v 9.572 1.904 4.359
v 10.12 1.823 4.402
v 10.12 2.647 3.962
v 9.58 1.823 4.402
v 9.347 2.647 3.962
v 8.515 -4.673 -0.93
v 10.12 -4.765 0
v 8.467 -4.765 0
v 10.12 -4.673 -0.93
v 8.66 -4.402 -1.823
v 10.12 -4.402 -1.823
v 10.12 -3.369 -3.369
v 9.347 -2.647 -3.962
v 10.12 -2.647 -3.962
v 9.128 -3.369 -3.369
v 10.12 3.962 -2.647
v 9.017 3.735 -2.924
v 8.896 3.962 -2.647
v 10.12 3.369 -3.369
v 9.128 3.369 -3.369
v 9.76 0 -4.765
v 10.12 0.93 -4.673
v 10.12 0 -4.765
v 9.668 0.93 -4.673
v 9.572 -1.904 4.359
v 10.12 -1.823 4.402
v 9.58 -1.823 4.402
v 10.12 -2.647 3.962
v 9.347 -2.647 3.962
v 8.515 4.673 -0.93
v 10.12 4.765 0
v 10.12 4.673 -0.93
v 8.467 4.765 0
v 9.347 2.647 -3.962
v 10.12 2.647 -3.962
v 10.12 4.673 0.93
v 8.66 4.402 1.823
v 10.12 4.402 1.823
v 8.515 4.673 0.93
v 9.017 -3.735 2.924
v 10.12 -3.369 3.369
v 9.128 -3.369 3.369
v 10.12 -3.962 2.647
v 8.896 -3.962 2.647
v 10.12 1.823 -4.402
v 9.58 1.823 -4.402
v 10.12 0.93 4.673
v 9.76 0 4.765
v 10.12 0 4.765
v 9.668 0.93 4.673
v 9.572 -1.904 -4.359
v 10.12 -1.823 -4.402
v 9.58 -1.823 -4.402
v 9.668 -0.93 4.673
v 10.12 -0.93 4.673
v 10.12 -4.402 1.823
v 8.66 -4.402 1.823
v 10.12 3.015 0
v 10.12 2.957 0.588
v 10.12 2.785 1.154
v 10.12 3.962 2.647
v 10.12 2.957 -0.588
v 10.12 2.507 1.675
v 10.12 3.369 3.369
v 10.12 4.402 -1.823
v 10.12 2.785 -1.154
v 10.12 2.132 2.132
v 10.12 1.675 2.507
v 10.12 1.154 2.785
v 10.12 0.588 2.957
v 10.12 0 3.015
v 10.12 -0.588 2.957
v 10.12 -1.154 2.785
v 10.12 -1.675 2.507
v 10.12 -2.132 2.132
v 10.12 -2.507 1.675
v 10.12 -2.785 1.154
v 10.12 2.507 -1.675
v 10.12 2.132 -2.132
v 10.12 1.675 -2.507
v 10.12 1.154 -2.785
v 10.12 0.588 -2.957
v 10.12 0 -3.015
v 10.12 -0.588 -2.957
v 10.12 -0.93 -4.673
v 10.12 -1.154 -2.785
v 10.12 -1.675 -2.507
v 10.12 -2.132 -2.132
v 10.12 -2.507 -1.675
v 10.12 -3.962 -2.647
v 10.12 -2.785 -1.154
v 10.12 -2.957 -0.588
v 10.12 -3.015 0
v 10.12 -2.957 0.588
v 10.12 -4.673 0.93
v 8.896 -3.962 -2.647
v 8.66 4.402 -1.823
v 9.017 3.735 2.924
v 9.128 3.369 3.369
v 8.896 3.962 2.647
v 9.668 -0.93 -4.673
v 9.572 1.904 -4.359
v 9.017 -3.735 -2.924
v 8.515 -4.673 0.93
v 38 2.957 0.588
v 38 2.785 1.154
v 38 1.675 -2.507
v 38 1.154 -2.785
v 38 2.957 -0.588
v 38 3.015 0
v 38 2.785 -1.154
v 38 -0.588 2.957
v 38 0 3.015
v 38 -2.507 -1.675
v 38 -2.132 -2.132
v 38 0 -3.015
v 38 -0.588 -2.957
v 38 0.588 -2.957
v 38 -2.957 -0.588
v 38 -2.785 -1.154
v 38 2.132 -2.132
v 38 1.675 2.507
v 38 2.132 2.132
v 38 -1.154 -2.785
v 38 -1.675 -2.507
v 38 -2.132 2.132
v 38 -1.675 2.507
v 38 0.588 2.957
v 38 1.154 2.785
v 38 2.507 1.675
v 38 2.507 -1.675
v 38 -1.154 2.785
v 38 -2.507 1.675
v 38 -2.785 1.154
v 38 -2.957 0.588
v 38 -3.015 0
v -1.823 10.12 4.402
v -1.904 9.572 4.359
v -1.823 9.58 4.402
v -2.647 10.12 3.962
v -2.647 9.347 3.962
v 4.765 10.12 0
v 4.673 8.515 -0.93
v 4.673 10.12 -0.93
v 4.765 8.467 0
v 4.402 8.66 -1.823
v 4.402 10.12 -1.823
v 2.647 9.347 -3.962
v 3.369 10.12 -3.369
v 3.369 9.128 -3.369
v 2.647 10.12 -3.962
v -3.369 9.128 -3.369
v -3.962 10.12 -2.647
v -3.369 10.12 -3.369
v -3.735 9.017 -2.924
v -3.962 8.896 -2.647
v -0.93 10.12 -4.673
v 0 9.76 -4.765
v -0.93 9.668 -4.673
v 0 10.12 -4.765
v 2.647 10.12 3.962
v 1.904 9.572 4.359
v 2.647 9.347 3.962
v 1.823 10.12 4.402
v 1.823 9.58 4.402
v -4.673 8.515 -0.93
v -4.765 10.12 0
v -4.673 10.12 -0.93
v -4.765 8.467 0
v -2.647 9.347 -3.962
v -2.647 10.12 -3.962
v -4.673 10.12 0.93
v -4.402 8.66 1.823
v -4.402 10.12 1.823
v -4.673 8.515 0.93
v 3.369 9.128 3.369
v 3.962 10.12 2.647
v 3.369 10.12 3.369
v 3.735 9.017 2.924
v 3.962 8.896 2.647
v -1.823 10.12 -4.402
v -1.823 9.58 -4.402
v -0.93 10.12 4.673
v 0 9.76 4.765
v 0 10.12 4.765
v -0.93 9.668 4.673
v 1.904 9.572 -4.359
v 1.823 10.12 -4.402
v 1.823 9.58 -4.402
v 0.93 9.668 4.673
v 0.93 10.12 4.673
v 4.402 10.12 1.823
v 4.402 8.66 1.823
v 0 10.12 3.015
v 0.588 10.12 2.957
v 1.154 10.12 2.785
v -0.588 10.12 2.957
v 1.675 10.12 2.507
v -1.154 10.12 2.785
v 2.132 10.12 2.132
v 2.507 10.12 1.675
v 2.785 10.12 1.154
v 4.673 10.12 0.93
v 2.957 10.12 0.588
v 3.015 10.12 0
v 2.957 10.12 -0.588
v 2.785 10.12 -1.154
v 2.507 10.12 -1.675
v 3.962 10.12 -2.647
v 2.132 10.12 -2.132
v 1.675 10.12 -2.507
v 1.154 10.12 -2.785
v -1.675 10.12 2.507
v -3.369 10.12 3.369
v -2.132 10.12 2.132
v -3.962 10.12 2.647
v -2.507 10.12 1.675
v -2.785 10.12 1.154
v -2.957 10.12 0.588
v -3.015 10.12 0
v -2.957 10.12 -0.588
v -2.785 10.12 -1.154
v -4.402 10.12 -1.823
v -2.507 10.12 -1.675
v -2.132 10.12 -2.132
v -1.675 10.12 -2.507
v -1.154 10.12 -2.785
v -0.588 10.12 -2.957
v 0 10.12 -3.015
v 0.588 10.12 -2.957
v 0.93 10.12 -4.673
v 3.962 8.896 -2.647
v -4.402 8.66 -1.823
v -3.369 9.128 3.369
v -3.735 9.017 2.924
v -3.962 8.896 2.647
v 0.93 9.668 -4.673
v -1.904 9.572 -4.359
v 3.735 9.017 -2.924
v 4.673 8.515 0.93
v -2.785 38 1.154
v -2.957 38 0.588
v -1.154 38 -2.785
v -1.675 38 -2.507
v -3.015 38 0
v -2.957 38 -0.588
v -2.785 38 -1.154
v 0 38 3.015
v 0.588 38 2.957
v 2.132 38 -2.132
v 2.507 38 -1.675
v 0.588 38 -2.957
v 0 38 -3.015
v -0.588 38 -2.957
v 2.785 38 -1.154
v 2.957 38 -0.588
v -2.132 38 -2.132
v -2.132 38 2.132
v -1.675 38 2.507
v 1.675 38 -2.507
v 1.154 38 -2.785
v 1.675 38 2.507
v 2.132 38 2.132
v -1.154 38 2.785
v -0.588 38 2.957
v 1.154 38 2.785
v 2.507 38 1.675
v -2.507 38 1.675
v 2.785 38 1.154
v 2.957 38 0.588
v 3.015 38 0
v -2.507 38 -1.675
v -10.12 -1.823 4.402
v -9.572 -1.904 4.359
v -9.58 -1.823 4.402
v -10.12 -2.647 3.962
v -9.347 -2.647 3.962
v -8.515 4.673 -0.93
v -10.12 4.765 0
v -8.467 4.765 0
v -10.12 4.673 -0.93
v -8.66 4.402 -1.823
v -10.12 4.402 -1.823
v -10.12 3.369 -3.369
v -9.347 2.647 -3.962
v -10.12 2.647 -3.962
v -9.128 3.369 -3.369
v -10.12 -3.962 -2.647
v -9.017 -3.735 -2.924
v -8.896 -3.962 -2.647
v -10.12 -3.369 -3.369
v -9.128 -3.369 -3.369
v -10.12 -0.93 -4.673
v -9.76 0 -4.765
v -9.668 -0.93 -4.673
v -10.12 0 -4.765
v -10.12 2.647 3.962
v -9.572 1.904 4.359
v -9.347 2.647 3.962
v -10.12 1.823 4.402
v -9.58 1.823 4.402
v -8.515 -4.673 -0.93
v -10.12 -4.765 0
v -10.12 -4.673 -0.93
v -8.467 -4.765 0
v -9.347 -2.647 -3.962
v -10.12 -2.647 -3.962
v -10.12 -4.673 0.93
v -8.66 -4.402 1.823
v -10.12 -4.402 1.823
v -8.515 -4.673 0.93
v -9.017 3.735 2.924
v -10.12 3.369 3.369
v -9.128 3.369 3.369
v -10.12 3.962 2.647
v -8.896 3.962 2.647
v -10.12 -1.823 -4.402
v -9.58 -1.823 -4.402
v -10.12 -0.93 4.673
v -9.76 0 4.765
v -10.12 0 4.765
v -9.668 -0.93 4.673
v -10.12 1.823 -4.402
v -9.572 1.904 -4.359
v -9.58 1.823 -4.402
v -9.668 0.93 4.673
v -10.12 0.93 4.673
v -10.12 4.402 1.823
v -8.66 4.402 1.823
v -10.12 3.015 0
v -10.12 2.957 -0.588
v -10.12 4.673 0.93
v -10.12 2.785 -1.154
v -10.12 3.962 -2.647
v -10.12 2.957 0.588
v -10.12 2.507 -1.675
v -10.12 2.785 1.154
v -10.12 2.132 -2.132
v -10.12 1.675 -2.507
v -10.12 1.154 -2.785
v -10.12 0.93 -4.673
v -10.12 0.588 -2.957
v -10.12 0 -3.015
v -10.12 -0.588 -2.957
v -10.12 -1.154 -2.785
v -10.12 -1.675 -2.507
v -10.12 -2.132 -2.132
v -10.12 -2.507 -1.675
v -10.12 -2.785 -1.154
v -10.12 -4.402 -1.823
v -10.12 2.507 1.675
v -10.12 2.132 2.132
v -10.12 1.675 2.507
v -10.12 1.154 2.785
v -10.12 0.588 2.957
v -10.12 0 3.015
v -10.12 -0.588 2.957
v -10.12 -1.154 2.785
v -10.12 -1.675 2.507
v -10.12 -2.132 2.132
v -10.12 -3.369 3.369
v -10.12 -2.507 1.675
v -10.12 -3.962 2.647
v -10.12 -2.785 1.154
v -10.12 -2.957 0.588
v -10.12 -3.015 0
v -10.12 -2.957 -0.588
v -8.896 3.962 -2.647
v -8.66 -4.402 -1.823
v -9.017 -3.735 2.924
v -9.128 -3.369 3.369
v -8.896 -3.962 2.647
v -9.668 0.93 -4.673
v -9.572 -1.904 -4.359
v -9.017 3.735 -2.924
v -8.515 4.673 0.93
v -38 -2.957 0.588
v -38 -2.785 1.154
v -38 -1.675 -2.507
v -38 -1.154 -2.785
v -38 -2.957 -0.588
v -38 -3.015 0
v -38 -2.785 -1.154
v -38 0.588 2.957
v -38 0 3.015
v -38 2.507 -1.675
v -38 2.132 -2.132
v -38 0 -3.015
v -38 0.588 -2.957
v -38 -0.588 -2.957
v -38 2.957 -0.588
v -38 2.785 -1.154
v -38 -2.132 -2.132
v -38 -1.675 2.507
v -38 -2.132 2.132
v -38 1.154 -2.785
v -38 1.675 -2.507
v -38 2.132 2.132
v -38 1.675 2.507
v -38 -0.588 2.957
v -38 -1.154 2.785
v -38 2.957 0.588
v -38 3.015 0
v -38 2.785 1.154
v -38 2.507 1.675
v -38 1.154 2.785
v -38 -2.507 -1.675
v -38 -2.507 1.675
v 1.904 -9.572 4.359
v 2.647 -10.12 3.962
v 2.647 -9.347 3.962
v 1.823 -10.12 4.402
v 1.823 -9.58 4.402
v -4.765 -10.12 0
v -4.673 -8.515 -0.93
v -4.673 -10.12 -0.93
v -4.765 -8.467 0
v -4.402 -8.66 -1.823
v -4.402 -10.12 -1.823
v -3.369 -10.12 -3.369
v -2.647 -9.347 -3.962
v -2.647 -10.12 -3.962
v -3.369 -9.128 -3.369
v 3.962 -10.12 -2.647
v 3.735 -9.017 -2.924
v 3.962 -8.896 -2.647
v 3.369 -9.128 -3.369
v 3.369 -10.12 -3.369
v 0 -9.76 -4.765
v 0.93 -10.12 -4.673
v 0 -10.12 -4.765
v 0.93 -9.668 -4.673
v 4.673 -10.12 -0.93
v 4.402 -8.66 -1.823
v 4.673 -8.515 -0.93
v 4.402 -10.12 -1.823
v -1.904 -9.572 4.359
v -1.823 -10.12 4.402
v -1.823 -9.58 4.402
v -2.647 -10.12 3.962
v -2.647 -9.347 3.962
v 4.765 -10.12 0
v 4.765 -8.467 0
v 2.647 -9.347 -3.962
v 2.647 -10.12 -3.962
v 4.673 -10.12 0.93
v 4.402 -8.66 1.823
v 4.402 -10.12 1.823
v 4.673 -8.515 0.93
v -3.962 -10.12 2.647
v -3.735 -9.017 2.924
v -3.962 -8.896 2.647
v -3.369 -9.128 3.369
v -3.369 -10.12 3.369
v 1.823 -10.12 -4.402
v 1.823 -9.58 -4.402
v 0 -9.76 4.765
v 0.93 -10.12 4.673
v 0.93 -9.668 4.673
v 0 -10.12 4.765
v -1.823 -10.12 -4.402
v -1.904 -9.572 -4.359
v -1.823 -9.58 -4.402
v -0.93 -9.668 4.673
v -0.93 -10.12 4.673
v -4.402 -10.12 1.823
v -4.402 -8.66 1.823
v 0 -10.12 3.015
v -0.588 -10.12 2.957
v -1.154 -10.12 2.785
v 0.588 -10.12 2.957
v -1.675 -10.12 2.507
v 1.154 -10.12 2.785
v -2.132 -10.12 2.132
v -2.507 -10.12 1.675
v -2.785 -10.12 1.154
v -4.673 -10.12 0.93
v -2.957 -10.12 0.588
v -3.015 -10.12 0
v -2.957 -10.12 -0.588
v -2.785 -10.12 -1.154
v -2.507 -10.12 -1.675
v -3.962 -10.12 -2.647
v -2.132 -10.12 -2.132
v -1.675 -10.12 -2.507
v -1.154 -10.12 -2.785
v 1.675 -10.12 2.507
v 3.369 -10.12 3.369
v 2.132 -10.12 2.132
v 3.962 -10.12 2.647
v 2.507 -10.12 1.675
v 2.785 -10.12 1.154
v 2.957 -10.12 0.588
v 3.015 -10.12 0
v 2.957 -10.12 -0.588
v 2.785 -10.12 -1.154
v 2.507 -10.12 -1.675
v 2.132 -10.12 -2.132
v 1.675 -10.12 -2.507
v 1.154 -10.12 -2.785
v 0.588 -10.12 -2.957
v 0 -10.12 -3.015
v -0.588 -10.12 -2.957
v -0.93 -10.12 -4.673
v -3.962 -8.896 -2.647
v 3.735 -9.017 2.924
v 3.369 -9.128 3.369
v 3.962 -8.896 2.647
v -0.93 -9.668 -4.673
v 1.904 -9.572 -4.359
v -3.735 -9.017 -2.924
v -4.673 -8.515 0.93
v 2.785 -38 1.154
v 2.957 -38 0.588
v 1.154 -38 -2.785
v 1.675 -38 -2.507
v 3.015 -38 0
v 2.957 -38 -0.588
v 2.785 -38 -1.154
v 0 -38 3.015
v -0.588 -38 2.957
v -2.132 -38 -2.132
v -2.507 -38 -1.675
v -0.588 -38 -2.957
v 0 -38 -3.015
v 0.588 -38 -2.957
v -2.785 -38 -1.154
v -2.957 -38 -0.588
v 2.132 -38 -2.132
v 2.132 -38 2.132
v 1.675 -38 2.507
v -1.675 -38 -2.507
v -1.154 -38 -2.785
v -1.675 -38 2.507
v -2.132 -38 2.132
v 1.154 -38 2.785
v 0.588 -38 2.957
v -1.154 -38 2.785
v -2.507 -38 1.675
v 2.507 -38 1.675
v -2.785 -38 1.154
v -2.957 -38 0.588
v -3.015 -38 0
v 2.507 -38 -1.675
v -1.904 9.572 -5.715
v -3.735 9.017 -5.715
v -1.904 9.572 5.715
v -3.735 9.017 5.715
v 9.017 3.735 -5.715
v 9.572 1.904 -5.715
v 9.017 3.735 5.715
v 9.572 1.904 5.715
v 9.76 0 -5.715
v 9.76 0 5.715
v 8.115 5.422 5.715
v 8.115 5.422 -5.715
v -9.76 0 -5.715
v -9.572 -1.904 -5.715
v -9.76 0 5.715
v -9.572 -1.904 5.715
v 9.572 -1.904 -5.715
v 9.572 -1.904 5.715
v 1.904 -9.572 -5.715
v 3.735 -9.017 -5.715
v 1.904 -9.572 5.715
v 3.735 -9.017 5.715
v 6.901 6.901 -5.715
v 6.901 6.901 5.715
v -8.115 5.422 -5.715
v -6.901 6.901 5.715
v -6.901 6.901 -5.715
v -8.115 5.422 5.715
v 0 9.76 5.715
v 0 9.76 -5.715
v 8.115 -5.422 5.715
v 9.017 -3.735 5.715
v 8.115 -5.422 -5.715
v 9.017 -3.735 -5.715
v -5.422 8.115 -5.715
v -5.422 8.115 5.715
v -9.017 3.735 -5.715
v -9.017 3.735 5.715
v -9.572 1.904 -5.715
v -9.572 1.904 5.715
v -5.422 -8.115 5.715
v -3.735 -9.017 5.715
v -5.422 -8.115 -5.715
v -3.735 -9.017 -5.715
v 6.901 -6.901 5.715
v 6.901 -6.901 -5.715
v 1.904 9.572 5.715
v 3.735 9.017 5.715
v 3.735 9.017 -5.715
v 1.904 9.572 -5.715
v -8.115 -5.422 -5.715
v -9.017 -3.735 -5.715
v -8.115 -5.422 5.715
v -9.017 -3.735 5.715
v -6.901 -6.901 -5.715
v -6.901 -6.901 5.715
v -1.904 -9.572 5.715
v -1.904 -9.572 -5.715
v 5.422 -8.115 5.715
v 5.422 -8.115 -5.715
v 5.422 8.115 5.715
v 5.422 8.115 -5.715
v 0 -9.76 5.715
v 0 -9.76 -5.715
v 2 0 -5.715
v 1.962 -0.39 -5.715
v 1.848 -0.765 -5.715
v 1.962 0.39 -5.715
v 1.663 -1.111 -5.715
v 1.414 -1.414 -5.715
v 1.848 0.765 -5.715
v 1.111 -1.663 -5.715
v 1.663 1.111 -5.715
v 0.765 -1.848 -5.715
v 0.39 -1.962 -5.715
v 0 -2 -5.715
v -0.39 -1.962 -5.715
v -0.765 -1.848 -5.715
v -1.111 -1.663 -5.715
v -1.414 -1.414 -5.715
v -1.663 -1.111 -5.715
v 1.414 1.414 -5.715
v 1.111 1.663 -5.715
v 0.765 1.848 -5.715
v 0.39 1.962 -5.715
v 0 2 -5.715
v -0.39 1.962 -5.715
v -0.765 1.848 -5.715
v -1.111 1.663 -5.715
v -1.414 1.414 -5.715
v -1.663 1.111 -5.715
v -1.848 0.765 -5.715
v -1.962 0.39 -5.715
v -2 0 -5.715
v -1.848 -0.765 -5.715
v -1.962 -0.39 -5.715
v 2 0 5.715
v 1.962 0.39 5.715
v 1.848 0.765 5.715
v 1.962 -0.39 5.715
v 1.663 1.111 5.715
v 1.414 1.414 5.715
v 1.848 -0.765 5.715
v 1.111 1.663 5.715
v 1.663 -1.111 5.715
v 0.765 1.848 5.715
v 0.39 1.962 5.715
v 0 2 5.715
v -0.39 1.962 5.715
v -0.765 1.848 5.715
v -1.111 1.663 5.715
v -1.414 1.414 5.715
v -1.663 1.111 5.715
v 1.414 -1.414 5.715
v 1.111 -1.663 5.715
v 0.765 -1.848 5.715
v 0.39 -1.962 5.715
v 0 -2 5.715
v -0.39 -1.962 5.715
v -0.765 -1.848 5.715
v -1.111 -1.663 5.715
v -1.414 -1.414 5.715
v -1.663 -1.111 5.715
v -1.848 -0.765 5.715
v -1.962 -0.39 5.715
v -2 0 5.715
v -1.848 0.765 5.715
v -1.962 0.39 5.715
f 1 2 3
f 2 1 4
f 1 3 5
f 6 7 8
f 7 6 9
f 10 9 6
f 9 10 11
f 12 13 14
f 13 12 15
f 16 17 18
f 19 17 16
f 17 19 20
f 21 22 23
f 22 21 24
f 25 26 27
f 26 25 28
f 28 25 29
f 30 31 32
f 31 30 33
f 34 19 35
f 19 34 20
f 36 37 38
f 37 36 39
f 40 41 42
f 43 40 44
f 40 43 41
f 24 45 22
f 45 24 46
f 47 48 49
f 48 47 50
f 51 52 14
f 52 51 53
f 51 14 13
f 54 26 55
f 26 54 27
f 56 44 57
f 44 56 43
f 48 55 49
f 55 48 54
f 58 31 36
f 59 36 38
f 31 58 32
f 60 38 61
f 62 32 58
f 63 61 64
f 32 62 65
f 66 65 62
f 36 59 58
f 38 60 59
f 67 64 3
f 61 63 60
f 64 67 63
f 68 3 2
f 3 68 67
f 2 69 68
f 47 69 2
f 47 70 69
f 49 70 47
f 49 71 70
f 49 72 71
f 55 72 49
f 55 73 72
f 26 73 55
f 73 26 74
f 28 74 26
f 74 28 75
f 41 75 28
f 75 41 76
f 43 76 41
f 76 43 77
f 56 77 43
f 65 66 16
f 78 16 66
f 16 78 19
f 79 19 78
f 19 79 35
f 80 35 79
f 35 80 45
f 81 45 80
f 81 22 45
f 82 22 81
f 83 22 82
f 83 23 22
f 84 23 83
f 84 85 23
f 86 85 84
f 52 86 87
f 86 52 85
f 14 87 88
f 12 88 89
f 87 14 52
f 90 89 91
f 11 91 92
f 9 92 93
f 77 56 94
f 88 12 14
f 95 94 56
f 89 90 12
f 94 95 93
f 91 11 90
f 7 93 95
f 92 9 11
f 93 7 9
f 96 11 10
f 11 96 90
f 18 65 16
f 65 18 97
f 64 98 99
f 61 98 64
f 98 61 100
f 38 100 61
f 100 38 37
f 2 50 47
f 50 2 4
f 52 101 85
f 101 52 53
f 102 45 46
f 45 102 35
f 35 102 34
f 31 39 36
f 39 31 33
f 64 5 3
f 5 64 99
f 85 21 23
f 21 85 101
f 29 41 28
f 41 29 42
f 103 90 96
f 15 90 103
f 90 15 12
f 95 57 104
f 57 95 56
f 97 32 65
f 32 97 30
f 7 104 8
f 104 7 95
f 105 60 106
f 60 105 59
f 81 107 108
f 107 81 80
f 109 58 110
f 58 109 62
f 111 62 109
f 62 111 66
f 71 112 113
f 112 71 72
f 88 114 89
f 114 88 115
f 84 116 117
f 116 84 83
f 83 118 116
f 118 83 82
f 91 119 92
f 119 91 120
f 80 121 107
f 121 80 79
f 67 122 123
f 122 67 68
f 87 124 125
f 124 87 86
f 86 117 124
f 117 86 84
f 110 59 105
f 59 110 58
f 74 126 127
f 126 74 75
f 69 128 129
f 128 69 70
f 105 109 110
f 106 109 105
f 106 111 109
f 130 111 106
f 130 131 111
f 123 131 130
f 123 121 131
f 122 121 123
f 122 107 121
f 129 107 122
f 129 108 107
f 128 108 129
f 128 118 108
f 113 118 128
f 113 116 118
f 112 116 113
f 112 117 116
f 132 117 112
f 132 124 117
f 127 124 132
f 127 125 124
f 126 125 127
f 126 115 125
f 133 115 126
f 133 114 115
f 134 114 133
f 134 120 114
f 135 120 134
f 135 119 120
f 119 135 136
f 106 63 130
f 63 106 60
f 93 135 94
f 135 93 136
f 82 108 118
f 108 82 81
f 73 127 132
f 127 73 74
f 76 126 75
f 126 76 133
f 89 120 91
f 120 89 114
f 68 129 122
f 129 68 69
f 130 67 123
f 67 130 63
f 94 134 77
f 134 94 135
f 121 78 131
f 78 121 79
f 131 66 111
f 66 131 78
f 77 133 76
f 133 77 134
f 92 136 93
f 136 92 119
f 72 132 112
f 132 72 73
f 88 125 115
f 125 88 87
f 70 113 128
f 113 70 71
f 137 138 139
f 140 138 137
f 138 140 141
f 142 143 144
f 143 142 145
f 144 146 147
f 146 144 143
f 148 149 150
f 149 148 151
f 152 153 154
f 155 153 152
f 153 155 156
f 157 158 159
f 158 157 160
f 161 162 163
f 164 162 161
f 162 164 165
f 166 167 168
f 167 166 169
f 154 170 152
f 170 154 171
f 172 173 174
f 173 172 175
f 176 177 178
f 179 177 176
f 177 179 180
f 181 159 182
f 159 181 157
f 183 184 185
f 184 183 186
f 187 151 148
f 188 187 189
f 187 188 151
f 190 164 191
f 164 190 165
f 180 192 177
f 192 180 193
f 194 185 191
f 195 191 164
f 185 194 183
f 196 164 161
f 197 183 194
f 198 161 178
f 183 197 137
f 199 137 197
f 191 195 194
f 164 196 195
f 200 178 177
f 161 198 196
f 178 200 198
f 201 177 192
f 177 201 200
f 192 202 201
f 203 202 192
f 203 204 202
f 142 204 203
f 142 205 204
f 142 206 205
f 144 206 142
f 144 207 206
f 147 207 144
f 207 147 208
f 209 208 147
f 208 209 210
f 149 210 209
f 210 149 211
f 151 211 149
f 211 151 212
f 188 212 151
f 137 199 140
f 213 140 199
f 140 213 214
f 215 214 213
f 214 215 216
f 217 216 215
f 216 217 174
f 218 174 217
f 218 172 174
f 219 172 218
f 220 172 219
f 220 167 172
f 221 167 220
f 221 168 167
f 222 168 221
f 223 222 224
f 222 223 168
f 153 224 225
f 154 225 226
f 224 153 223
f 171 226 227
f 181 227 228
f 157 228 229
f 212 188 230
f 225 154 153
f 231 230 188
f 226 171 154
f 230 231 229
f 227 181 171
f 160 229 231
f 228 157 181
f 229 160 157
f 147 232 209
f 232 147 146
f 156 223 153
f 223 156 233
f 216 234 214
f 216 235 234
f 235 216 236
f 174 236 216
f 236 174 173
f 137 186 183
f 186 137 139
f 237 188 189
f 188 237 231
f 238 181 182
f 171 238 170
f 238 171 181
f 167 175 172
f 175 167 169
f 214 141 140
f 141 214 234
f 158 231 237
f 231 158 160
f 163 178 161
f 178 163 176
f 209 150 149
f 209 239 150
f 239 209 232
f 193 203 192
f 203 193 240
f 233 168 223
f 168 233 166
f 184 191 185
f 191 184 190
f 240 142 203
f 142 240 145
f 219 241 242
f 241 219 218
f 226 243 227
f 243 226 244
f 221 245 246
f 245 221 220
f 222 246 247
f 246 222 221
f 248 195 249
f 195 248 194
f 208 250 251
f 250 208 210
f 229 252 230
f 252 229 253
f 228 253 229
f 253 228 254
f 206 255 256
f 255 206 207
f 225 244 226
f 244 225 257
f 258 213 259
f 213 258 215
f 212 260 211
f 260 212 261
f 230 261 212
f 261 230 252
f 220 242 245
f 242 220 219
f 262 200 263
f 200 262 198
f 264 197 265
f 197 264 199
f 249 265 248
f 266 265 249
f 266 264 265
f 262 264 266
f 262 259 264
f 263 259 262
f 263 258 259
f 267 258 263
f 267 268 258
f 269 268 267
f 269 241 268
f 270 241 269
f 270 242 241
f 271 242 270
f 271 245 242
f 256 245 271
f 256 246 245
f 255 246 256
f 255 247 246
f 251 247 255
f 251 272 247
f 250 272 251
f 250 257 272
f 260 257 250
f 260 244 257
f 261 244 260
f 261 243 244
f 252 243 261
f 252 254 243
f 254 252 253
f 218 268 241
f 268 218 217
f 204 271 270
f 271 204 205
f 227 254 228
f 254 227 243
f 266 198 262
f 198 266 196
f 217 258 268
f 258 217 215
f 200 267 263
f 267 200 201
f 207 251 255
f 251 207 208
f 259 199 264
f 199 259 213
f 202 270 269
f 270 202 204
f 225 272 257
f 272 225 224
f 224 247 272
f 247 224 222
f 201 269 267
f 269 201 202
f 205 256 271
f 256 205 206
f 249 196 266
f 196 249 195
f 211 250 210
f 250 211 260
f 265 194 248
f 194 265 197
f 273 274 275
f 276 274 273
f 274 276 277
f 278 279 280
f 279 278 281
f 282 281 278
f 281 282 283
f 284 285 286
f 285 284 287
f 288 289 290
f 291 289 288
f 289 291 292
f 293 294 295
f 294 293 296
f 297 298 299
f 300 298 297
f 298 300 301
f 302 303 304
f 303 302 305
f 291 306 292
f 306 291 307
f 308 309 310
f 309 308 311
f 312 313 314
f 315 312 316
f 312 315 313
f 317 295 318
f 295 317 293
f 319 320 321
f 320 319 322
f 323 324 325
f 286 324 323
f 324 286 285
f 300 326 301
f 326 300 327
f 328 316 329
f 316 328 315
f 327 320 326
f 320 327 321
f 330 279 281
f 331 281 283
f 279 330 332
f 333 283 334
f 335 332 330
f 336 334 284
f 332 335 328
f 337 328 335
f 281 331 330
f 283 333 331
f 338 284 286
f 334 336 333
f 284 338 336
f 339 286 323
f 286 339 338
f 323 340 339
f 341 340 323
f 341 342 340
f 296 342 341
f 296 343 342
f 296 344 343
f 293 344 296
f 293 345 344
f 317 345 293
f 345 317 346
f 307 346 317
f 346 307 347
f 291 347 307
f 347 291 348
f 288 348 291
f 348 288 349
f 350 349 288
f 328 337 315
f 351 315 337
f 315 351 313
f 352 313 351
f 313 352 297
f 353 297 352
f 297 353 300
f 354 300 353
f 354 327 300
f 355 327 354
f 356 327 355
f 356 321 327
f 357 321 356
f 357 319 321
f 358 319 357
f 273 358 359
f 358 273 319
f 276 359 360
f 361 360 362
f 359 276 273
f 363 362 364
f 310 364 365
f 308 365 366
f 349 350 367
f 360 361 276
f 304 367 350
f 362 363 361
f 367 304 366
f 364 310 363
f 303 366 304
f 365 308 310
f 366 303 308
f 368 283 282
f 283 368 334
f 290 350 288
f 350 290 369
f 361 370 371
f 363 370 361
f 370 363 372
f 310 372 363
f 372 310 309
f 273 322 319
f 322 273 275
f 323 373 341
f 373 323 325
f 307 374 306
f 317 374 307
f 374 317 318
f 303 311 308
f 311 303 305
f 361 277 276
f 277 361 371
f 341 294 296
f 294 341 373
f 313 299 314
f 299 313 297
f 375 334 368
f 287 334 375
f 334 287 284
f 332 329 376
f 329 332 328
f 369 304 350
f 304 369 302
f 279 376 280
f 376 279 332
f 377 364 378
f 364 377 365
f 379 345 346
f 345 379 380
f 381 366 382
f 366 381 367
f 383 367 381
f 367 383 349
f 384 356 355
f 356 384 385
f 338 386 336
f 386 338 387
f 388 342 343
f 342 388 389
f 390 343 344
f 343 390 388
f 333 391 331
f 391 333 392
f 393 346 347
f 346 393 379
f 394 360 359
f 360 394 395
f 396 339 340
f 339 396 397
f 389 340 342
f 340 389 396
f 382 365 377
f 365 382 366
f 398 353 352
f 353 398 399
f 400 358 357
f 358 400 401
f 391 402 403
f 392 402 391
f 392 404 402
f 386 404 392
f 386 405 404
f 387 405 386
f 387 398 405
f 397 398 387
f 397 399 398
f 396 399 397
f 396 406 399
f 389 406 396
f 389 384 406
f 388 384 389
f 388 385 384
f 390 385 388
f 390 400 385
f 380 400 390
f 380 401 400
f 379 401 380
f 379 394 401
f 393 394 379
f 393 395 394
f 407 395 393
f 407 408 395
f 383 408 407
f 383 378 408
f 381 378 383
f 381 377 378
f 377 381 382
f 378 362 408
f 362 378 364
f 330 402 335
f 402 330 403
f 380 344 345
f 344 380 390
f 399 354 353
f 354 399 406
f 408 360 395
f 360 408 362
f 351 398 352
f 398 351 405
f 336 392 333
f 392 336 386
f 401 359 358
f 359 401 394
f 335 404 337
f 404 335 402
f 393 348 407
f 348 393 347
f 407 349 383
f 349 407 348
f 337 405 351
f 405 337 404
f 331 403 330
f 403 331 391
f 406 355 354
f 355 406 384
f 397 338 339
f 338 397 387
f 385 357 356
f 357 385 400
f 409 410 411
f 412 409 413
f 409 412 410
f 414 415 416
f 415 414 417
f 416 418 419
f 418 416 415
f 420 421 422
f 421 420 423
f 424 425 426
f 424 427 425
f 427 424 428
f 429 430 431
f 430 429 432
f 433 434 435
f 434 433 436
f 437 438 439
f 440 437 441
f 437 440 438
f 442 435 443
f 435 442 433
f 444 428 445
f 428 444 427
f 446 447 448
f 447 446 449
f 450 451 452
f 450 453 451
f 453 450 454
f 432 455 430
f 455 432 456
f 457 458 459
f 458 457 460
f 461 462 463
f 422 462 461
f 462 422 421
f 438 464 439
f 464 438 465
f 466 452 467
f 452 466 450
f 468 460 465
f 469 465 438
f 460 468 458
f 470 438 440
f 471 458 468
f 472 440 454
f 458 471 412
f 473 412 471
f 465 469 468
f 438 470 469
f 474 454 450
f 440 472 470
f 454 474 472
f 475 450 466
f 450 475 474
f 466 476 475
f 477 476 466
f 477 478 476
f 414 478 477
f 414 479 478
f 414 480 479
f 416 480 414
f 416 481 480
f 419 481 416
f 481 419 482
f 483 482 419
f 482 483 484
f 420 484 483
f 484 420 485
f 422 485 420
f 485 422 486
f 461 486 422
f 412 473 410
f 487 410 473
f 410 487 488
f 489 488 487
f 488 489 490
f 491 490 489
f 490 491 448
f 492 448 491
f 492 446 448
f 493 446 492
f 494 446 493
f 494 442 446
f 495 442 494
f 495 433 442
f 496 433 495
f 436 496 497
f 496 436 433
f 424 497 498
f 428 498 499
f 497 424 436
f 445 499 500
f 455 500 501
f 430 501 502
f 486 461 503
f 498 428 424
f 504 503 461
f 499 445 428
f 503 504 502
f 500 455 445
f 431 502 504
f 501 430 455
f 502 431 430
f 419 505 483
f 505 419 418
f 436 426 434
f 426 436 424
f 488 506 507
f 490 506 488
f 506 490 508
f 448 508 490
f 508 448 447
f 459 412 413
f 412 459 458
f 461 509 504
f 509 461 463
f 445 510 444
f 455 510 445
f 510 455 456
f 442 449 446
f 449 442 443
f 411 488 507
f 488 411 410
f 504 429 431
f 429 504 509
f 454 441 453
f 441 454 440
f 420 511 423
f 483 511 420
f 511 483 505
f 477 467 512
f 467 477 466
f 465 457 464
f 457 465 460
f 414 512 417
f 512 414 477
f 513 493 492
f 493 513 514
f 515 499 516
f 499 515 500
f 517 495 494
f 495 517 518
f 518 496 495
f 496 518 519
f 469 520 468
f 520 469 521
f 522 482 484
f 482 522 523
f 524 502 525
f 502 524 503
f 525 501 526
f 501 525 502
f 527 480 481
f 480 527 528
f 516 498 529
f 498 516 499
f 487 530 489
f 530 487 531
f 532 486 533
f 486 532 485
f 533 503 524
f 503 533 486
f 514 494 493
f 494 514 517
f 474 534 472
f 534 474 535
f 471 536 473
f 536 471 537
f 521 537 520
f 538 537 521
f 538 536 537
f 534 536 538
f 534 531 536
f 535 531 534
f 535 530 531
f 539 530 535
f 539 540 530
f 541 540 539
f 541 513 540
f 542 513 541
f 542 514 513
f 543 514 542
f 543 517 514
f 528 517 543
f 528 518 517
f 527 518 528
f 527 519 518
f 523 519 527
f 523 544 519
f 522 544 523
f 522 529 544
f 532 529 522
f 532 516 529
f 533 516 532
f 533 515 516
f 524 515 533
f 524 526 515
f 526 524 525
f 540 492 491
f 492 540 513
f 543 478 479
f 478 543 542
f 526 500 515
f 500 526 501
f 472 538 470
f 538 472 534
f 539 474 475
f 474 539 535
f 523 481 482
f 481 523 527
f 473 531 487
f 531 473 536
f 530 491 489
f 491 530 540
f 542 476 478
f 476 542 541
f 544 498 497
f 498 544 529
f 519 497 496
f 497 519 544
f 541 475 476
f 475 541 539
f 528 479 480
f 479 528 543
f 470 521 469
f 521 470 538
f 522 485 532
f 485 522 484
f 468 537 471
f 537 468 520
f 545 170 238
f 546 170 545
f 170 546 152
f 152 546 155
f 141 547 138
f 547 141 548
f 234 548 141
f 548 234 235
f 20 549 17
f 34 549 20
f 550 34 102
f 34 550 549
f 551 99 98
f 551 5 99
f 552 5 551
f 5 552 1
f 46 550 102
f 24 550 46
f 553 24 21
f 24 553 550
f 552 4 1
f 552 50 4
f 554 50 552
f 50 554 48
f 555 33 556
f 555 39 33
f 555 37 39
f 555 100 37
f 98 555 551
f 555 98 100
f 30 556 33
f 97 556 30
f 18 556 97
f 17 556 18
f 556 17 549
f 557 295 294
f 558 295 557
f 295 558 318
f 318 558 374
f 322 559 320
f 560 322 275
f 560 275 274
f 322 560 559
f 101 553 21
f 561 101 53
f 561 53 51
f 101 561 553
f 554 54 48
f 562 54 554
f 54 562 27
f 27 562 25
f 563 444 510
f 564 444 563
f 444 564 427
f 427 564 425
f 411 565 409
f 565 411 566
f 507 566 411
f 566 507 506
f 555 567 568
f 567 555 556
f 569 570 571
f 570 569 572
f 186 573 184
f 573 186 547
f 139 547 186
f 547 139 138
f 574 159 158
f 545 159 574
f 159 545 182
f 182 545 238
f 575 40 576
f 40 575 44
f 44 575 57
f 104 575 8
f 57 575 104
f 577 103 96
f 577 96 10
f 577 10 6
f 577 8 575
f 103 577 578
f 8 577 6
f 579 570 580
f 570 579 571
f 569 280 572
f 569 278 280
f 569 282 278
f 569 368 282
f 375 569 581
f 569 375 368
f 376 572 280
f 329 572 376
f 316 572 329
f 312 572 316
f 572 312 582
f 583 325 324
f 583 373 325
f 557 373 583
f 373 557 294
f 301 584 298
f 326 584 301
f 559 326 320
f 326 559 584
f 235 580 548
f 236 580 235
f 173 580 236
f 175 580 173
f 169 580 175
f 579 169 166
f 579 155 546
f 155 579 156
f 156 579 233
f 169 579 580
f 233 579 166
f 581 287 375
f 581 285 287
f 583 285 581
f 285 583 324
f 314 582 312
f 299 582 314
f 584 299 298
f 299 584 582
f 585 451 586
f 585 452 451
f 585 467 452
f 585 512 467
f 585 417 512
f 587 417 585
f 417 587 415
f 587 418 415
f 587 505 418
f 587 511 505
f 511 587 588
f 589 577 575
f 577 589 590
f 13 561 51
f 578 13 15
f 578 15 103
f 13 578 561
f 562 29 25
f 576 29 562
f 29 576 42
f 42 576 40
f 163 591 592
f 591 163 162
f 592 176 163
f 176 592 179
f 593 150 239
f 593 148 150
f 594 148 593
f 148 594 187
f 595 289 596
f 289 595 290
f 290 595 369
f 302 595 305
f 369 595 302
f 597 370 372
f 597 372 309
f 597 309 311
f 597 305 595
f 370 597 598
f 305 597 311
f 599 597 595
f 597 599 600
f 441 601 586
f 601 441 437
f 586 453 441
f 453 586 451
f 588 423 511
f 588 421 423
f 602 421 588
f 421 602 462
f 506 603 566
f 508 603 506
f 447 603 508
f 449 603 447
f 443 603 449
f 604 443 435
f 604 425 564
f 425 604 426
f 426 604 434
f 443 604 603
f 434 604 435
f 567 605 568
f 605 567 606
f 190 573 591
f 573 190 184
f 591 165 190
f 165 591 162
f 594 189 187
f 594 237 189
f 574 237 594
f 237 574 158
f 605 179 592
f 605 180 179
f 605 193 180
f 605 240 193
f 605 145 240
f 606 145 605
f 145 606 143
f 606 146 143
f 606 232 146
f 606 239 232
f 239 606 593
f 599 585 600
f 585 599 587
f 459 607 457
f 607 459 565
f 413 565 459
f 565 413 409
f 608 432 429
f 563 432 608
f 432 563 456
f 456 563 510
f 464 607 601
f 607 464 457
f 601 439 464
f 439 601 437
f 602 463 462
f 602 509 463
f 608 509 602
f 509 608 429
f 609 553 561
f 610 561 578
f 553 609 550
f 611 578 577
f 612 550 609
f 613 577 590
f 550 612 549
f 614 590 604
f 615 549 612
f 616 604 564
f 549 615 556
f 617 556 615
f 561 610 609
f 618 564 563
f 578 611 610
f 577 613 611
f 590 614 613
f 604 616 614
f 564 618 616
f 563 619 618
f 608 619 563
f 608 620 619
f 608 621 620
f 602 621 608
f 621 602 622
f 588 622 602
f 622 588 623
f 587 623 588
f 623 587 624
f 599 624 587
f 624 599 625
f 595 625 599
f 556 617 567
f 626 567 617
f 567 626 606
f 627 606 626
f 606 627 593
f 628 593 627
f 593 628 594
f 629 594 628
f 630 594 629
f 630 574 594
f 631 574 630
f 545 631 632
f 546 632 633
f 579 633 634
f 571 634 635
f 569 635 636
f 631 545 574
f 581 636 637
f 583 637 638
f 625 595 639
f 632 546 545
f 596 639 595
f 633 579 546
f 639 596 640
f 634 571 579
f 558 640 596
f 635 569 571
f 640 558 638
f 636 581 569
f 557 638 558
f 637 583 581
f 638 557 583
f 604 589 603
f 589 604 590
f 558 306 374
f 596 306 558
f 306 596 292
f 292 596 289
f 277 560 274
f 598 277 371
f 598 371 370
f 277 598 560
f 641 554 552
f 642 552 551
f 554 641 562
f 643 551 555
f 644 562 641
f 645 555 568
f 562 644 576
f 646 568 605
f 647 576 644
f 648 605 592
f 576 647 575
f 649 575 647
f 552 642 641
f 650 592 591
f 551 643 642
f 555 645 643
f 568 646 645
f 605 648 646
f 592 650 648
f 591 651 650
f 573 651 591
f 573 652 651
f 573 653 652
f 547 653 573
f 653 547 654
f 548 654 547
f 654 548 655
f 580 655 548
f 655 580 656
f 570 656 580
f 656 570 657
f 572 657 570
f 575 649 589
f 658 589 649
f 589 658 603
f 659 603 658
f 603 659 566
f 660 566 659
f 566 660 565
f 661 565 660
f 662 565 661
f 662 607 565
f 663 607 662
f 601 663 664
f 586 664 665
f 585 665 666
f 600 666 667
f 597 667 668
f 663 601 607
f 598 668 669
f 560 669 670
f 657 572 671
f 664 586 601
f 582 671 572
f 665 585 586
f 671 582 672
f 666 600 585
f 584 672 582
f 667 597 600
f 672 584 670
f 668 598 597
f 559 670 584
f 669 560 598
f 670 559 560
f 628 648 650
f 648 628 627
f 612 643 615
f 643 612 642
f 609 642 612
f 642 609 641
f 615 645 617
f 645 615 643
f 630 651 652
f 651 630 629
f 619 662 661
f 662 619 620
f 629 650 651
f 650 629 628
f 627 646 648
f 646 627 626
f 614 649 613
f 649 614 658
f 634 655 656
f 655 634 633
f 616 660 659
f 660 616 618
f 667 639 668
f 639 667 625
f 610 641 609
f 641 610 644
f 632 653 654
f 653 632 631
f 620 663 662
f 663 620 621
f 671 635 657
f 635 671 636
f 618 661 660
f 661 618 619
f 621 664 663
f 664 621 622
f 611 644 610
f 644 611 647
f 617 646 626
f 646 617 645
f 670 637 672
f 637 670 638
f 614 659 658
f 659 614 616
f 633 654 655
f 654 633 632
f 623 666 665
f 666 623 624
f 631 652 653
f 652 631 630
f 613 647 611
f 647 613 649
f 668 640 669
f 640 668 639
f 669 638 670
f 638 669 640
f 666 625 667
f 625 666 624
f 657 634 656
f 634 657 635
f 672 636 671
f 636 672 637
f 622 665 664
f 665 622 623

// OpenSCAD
$fn = 32;

// ----------------------------------------------------------------------
// Cardan cross: 76 mm span, 9.53 mm trunnions
// ----------------------------------------------------------------------

// --- parameters (mm) ---
journal_d = 9.53;         // trunnion diameter
arm_len = 38;             // trunnion length from the centre
step_r = 3.24;            // step position from the centre
step_d = 6.03;            // journal diameter after the step
hub_d = 19.52;            // hub diameter
hub_h = 11.43;            // hub height
bore_d = 4;               // hub bore

difference() {
  union() {
    /* hub along the joint axis */
    cylinder(h = hub_h, d = hub_d, center = true);
    for (a = [0 : 90 : 270]) rotate([0, 0, a]) {
      /* trunnion, sunk into the hub */
      translate([hub_d / 4, 0, 0]) rotate([0, 90, 0]) cylinder(h = step_r + 2, d = journal_d);
      /* stepped journal out to the tip */
      translate([step_r - 0.5, 0, 0]) rotate([0, 90, 0]) cylinder(h = arm_len + 0.5 - step_r, d = step_d);
    }
  }
  /* lubrication bore through the hub, 2.5 mm clear on both sides */
  translate([0, 0, -hub_h / 2 - 2.5]) cylinder(h = hub_h + 5, d = bore_d);
}
